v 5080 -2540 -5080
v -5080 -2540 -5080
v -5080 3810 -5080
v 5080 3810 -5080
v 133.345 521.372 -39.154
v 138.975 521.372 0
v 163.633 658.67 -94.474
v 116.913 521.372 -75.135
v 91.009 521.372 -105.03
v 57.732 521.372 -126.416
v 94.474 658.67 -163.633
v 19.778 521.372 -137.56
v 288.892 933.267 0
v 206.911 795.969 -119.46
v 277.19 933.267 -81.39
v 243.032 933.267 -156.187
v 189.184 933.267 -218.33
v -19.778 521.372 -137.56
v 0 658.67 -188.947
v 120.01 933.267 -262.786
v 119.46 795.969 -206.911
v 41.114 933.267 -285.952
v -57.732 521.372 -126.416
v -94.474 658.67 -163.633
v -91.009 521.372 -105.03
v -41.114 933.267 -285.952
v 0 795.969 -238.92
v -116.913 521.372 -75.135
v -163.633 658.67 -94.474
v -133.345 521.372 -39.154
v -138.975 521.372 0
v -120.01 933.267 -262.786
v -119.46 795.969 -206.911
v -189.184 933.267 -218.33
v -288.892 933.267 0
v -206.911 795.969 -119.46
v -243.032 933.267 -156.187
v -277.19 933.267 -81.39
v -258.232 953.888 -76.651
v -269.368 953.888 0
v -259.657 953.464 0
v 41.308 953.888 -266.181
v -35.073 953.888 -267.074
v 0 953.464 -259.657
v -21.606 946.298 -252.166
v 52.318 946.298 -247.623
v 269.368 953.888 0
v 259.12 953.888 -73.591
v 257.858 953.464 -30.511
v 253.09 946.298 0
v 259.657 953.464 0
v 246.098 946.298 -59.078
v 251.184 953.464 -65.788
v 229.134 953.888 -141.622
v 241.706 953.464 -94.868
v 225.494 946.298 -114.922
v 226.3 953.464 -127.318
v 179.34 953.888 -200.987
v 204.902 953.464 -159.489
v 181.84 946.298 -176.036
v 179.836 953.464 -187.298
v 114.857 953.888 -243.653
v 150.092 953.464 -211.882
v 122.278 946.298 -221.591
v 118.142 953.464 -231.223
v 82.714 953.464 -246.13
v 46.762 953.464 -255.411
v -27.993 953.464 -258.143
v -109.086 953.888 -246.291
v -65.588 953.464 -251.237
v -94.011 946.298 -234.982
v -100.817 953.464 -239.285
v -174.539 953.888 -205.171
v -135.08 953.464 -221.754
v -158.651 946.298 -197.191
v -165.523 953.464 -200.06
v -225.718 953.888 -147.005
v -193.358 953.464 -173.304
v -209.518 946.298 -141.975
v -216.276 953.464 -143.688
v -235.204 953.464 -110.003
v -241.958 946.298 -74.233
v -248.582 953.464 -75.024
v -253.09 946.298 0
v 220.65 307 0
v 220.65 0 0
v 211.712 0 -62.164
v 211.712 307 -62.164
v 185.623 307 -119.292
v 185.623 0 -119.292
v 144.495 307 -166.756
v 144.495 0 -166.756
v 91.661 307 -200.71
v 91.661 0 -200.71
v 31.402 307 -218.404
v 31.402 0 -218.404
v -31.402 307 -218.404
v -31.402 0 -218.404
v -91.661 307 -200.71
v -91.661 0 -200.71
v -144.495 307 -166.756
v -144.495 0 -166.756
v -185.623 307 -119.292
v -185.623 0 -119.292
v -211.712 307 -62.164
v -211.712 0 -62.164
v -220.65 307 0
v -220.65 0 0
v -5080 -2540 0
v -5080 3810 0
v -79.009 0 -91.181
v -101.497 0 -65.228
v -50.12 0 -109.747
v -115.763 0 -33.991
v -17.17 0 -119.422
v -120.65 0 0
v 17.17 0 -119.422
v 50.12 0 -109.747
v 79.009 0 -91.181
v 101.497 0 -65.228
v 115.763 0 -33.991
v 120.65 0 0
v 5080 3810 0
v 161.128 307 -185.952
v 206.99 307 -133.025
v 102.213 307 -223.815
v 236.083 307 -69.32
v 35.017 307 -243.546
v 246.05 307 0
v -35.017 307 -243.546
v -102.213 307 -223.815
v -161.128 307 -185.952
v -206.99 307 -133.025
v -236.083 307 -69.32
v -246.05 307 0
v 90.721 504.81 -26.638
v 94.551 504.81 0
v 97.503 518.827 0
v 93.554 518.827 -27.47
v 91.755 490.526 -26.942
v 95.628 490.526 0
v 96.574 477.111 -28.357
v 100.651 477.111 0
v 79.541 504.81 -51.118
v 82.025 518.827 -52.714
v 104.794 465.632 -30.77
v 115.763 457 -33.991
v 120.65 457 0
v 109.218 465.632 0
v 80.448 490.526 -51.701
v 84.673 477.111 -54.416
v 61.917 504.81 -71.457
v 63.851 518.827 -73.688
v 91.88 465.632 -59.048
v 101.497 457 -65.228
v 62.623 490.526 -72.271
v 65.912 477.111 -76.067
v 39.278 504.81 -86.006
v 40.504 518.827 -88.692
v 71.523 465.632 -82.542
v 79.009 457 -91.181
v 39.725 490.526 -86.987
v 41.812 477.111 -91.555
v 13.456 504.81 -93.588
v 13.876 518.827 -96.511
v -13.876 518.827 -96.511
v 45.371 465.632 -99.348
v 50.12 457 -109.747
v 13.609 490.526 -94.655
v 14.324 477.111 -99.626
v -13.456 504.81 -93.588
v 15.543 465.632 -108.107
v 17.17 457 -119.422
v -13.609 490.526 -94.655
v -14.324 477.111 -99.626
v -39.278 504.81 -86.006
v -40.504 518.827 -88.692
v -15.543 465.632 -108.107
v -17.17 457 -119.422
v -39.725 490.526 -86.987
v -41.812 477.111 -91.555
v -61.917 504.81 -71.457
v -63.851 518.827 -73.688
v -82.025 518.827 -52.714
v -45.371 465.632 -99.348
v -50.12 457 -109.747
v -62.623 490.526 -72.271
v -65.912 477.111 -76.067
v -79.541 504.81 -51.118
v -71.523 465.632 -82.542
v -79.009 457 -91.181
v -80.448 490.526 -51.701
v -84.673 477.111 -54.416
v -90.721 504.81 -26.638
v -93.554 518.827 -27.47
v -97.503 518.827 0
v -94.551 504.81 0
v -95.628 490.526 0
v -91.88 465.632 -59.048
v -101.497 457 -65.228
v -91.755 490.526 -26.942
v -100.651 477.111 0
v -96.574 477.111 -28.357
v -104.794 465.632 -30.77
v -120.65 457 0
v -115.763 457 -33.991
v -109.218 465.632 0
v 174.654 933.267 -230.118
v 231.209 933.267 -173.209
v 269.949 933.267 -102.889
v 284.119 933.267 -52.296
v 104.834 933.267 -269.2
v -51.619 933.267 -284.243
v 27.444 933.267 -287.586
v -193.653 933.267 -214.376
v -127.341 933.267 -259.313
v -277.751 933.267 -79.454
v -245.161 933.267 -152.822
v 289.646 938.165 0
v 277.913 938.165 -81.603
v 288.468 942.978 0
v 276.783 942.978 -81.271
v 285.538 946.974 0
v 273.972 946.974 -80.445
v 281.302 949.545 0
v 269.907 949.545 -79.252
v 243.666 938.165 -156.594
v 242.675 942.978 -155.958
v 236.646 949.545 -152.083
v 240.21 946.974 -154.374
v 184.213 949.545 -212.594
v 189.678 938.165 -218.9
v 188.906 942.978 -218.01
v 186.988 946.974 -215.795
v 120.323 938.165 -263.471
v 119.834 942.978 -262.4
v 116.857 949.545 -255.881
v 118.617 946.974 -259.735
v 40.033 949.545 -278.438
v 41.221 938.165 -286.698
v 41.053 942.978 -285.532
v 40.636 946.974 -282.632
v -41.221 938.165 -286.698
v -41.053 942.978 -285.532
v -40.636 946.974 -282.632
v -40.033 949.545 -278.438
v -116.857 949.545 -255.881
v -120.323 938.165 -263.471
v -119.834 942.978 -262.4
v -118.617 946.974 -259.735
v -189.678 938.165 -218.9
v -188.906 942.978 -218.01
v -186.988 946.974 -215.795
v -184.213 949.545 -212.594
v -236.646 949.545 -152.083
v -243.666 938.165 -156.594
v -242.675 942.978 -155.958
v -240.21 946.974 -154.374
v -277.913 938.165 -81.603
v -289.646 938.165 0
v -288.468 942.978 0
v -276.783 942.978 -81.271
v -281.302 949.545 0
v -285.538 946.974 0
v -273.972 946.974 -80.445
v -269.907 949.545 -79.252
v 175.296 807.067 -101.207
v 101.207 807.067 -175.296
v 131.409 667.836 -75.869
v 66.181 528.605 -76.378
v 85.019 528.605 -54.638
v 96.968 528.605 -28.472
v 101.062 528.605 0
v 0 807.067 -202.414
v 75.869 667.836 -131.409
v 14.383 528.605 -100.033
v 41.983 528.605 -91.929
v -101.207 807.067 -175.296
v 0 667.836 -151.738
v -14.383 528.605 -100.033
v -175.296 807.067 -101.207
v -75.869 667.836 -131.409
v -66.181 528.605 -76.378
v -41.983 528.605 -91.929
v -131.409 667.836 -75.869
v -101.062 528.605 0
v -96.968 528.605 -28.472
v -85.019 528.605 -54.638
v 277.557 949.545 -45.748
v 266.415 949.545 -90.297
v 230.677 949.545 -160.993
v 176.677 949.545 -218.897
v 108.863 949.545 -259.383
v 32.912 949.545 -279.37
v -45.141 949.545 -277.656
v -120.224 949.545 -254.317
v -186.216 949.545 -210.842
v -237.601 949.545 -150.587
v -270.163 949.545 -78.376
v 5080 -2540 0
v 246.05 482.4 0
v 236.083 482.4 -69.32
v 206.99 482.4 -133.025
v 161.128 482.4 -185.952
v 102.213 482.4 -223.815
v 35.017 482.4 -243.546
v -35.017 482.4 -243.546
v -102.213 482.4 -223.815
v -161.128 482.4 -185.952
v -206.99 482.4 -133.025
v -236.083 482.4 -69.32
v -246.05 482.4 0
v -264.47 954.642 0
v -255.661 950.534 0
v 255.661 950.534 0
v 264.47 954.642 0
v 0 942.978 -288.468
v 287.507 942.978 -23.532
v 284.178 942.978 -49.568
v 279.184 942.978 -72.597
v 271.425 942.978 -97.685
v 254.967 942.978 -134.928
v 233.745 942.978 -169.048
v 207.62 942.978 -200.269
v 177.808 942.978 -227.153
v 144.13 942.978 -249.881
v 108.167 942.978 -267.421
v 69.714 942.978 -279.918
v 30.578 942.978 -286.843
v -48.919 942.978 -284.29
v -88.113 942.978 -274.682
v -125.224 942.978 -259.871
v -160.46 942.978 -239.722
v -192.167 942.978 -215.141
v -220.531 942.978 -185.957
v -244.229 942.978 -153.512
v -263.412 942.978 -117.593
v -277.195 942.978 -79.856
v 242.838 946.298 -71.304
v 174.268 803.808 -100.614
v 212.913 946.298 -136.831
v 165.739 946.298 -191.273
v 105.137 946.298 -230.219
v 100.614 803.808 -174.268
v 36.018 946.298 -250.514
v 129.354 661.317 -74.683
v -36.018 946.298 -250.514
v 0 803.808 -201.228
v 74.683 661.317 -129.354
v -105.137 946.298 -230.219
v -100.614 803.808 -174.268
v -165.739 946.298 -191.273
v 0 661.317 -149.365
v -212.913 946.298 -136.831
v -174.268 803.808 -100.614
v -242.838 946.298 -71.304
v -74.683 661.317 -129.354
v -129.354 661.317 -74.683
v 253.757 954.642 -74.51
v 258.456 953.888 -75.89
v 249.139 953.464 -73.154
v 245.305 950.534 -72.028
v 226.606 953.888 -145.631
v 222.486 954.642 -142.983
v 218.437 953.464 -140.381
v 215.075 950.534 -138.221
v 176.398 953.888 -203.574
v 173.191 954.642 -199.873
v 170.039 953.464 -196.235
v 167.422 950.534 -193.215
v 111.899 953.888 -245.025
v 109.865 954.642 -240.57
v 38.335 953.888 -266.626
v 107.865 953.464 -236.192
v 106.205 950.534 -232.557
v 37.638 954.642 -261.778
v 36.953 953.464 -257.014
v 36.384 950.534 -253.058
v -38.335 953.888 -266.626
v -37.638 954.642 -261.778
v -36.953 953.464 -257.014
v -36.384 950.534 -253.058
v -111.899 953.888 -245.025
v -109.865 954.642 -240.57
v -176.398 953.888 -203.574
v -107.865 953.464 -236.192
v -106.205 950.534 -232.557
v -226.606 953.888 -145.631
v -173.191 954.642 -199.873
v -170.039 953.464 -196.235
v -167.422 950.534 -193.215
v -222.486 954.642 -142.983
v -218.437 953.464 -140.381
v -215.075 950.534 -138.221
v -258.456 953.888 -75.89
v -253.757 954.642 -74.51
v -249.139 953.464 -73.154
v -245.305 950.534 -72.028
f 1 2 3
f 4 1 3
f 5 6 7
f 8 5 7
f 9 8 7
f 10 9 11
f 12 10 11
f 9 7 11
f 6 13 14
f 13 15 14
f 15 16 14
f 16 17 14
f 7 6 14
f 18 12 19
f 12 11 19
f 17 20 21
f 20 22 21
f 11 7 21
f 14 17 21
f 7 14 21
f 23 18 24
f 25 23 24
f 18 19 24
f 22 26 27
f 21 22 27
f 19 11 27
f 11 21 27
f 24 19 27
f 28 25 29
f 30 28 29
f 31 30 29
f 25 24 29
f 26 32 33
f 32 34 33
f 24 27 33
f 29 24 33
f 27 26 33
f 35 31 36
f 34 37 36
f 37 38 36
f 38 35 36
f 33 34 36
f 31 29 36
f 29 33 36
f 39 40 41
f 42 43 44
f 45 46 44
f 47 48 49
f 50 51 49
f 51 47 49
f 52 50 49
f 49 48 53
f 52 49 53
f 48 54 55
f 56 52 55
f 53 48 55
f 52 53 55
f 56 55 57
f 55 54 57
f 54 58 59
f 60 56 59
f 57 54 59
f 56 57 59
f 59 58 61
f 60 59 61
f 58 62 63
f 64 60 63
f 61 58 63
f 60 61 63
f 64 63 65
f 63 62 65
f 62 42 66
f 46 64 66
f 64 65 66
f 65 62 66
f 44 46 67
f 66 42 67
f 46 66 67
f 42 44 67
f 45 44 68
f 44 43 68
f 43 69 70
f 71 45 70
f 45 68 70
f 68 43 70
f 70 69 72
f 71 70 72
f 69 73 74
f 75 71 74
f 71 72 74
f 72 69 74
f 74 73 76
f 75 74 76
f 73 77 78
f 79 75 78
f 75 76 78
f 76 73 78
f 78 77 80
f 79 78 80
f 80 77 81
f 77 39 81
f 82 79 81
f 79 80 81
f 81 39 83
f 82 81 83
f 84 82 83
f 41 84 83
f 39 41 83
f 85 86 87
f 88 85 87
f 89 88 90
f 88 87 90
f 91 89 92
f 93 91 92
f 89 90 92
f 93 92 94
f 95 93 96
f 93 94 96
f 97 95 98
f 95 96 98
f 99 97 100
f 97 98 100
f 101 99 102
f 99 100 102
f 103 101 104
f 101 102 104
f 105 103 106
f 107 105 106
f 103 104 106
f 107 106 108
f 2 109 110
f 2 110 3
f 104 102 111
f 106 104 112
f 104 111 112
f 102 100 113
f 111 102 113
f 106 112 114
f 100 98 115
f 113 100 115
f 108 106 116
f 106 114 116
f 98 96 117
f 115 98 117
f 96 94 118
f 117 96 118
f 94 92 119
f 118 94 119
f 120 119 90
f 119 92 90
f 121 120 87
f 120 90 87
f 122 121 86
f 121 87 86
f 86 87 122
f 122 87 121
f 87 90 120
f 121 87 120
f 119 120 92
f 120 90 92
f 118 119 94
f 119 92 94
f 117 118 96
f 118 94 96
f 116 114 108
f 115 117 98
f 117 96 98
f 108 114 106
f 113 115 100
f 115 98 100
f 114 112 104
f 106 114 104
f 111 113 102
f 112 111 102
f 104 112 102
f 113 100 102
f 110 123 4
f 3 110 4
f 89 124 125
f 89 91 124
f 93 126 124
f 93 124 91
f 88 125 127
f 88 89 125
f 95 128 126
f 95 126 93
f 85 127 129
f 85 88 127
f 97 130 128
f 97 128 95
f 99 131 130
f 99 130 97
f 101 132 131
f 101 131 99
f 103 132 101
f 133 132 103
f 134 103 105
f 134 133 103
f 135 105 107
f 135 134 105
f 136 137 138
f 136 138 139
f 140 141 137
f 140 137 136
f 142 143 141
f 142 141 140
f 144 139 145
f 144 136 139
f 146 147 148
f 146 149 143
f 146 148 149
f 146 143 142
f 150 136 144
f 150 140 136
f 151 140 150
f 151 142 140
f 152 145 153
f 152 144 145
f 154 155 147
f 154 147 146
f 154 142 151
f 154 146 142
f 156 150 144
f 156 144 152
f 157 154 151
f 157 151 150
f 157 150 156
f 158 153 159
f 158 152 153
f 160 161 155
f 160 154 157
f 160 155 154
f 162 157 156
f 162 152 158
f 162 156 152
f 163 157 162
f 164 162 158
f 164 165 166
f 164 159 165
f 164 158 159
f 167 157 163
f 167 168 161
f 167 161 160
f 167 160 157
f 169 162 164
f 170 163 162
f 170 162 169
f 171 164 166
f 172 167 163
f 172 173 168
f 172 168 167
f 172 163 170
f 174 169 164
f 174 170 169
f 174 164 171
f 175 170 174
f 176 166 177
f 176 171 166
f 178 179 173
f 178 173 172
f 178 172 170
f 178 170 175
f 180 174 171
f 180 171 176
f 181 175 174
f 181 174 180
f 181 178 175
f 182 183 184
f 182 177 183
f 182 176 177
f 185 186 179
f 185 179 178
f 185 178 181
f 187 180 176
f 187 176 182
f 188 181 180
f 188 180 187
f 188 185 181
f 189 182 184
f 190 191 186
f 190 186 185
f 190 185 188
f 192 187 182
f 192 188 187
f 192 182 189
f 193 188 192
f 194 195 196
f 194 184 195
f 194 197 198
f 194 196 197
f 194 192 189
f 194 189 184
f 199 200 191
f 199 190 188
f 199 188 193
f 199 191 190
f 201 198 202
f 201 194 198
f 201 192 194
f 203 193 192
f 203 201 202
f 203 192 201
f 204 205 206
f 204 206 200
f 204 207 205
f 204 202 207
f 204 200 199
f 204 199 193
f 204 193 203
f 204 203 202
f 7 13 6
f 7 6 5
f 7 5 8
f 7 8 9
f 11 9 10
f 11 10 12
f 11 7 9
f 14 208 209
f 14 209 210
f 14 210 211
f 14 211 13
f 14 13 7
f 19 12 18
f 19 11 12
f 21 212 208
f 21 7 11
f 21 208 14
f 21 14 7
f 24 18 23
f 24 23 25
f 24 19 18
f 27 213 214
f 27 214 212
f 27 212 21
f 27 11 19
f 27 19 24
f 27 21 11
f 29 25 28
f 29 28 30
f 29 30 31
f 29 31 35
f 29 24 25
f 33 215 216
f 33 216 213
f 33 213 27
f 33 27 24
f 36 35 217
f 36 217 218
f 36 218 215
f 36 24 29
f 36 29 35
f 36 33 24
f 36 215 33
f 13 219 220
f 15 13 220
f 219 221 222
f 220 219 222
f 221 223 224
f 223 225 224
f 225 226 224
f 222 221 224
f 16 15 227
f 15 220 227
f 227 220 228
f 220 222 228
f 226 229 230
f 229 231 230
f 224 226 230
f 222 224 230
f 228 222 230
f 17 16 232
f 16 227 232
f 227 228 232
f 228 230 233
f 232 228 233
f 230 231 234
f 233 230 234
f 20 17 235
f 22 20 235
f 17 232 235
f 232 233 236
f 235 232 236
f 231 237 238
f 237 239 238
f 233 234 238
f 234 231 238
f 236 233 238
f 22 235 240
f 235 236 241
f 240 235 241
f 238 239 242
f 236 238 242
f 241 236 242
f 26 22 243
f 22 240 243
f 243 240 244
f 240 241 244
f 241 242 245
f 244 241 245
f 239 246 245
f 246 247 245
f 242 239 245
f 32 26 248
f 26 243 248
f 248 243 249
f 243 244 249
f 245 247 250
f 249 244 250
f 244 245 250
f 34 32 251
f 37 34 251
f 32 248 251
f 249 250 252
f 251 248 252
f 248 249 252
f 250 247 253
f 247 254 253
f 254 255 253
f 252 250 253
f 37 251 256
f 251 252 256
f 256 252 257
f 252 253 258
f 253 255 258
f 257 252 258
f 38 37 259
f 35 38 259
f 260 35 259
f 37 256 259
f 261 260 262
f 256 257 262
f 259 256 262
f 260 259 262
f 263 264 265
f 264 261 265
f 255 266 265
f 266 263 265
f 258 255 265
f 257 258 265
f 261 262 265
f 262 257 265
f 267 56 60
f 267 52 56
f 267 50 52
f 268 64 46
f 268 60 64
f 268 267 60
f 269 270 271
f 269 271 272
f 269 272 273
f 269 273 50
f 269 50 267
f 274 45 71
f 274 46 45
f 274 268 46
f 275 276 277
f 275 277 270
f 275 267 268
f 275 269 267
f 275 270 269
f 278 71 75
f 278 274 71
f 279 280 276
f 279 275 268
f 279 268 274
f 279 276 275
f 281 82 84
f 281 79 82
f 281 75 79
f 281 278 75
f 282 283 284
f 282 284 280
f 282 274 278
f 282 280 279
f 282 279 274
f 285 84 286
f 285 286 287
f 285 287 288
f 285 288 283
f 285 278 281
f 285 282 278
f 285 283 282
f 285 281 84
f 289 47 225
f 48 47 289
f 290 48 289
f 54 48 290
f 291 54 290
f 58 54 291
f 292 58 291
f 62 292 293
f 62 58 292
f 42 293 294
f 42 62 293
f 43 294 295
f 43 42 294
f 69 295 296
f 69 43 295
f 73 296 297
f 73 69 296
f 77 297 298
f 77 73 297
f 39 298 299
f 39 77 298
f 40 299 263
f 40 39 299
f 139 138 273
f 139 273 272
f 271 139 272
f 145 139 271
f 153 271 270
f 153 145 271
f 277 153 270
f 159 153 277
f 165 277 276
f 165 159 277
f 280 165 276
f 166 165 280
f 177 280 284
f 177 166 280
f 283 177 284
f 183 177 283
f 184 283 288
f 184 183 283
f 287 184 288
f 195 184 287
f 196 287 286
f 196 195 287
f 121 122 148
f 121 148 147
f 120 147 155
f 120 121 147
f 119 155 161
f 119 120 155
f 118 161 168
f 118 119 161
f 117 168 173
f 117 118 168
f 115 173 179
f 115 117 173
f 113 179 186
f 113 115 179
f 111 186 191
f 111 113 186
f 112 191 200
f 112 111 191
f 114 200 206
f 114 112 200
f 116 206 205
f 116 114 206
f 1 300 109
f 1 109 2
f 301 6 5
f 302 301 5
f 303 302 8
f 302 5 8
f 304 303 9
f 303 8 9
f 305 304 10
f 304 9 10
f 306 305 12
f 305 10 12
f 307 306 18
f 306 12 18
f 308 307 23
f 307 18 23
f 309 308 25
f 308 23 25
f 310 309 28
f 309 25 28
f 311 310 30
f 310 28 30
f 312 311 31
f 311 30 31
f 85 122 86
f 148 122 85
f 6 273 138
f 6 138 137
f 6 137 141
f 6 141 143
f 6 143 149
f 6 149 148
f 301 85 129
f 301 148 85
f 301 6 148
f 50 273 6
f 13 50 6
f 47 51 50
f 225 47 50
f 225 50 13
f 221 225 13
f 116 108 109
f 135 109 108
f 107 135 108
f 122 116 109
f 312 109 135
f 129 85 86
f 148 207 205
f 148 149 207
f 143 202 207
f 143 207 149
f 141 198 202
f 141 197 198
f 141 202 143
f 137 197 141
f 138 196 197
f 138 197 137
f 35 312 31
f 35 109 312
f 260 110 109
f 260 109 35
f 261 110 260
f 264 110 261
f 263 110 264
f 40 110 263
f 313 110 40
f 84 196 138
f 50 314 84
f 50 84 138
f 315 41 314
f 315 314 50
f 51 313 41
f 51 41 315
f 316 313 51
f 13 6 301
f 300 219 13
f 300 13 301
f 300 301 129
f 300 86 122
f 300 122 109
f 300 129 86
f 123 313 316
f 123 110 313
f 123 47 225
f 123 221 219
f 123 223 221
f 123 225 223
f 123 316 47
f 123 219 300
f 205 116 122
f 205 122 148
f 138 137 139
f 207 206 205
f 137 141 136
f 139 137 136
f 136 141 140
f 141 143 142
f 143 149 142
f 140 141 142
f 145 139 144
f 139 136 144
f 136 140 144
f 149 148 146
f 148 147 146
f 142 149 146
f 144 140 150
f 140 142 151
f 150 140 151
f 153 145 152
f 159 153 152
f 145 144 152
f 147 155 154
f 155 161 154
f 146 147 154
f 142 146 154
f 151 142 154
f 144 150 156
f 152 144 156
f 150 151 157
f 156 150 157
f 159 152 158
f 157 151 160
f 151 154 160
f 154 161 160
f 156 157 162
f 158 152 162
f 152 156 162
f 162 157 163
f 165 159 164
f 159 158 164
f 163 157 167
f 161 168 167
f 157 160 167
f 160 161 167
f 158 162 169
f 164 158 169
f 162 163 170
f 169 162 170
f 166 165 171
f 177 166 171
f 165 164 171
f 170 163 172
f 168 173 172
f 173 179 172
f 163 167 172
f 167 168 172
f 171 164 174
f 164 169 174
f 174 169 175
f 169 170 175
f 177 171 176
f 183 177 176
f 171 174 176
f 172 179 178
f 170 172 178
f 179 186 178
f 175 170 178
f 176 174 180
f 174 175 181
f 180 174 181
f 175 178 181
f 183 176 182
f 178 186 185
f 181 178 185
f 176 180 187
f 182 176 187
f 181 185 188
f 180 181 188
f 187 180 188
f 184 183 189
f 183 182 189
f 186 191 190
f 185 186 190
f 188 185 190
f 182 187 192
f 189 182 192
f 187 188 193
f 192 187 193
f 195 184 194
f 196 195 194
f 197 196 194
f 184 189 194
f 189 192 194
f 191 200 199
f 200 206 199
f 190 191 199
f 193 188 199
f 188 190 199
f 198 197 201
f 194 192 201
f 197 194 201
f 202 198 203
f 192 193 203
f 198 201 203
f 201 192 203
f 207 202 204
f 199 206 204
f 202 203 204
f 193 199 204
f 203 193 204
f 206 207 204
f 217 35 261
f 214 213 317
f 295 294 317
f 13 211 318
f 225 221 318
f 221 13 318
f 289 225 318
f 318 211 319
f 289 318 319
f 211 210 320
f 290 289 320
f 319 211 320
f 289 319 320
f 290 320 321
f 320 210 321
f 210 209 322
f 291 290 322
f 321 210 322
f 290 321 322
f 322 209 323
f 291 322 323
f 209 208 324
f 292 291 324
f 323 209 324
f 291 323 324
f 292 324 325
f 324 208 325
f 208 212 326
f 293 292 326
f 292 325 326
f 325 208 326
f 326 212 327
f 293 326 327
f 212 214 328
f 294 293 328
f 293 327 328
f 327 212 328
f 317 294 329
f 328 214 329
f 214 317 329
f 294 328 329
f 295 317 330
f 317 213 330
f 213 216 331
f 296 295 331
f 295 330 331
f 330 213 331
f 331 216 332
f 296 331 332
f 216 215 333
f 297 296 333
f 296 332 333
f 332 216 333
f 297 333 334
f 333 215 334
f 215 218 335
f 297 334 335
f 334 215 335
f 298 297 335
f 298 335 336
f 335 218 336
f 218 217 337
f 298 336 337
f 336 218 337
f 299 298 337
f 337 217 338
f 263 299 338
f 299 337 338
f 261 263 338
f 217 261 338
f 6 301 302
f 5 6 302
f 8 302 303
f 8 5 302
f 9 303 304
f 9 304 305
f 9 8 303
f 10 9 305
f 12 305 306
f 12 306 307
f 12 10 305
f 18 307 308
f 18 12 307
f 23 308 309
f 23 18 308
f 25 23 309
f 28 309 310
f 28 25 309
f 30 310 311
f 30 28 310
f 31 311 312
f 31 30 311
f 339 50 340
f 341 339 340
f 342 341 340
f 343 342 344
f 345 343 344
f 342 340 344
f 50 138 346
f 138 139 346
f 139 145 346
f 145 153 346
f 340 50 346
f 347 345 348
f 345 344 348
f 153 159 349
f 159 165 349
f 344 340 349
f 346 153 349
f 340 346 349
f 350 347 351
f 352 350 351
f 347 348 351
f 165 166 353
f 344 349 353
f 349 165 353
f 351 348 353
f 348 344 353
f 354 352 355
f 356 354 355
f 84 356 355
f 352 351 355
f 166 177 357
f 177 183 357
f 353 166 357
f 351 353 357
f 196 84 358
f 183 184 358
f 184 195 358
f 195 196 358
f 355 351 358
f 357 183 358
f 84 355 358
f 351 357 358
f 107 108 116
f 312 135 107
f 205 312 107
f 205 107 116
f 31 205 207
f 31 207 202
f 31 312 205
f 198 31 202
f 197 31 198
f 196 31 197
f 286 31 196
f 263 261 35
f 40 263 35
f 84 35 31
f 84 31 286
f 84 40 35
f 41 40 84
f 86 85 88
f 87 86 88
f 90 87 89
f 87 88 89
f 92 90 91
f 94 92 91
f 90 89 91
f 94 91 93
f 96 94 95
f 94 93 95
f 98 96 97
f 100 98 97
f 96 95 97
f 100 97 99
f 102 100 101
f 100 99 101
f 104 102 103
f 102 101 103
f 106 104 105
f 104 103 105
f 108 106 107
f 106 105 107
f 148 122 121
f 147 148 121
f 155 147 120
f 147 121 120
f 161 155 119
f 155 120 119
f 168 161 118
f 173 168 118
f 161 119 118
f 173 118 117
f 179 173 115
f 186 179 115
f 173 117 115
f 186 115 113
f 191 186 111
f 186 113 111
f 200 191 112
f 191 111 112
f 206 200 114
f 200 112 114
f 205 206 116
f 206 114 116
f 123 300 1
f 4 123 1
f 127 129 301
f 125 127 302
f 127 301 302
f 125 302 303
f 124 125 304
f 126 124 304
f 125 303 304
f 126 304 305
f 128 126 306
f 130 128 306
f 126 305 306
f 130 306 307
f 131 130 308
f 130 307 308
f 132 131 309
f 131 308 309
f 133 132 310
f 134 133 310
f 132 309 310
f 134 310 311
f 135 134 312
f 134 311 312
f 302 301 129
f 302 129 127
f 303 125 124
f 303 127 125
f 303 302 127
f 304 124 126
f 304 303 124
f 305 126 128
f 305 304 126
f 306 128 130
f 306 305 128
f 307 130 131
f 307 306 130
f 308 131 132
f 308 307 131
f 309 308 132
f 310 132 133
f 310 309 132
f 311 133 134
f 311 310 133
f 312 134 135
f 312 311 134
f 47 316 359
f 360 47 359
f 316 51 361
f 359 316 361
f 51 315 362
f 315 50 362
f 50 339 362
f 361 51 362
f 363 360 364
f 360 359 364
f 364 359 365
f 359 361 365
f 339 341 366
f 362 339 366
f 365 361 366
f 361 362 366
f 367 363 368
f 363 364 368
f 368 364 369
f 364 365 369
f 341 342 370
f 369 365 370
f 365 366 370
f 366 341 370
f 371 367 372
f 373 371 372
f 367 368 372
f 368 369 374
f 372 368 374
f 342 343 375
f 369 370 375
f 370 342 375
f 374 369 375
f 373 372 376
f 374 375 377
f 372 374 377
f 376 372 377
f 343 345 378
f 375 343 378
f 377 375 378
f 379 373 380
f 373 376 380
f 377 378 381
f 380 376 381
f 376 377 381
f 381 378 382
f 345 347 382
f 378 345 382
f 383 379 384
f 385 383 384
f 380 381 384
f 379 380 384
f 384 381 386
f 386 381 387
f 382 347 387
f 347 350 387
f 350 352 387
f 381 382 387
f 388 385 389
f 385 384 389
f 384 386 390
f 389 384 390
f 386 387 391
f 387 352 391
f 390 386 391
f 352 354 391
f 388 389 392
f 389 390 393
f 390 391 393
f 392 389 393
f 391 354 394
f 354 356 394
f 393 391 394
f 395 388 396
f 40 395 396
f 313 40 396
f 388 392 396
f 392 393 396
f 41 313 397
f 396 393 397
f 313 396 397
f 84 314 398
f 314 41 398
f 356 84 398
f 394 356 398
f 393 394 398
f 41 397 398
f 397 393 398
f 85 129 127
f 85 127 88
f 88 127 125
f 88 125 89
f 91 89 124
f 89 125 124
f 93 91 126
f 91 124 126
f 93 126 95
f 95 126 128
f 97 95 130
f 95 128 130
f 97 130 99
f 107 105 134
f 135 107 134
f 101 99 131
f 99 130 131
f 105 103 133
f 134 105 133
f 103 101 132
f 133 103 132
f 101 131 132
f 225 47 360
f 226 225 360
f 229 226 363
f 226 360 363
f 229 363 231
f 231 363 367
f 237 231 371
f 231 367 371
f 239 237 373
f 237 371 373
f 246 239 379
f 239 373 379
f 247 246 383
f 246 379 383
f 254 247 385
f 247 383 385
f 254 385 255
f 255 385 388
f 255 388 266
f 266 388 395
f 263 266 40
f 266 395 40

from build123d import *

# Parameters (mm, degrees)
SKETCH1_R           = 220.65
SKETCH1_R_2         = 120.65
BOSS_EXTRUDE1_DEPTH = 457
FILLET1_R           = 50.8
FILLET2_R           = 12.7
SKETCH3_W           = 10160
SKETCH3_H           = 6350
BOSS_EXTRUDE2_DEPTH = 5080
SKETCH4_W           = 13475.768327993
SKETCH4_H           = 8367.586519284
CUT_EXTRUDE1_DEPTH  = 8132.96778154


# Read off the part's stored shape, not the designer's step: Intersect1
with BuildPart() as part:
    # Sketch1 → Boss-Extrude1 (new body)
    with BuildSketch(Plane(origin=(0, 0, 0), x_dir=(1, 0, 0), z_dir=(0, 1, 0))):
        with Locations(Location((0, 0, 0), (0, 0, 270))):
            Circle(SKETCH1_R)
        with Locations(Location((0, 0, 0), (0, 0, 270))):
            Circle(SKETCH1_R_2, mode=Mode.SUBTRACT)
    extrude(amount=BOSS_EXTRUDE1_DEPTH)

    # Sketch2 → Revolve1 (revolve)
    with BuildSketch(Plane.XY, mode=Mode.PRIVATE) as revolve1_sk:
        Polygon((-220.65, 307), (-246.05, 307), (-246.05, 482.4), (-138.974740497, 521.372207285), (-293.235833302, 945.201076466), (-257.43354445, 958.232043927), (-101.061934921, 528.604577704), (-75, 457), (-220.65, 457), align=None)
    revolve(revolve1_sk.sketch.rotate(Axis((0, 0, 0), (0, 1, 0)), 270), axis=Axis((0, 0, 0), (0, 1, 0)))

    # Fillet1
    # the kernel refuses this fillet: 50.8 mm, written as the material it takes off along each edge
    with BuildSketch(Plane(origin=(0, 457, 0), x_dir=(0, 0, -1), z_dir=(1, 0, 0))) as fillet1_piece_1:
        with BuildLine():
            CenterArc((145.239501631, 44.452181156), FILLET1_R, 160, 81.050057514)
            Line((120.65, 0), (120.158209967, -0.889043623))
            ThreePointArc((120.158209967, -0.889043623), (97.825, -1.016), (75, -1.016))
            Line((75, -1.016), (74.045272297, 0.347492466))
            Line((74.045272297, 0.347492466), (96.548388792, 62.174296903))
            Line((96.548388792, 62.174296903), (97.503116495, 61.826804437))
        make_face()
    revolve(axis=Axis((0, 457, 0), (0, 1, 0)), mode=Mode.SUBTRACT)

    # Fillet2
    fillet2_edges = [part.edges().sort_by_distance(p)[0] for p in [
        (0, 945.201076466, 293.235833302),
        (0, 958.232043927, 257.43354445),
    ]]
    fillet(fillet2_edges, radius=FILLET2_R)


with BuildPart() as body_2:
    # Sketch3 → Boss-Extrude2 (new, symmetric)
    with BuildSketch(Plane(origin=(0, 0, 0), x_dir=(0, 0, -1), z_dir=(1, 0, 0))):
        with Locations((0, 635)):
            Rectangle(SKETCH3_W, SKETCH3_H)
    extrude(amount=BOSS_EXTRUDE2_DEPTH, both=True)

    # Intersect1 outline → Intersect1 (revolve, cut)
    with BuildSketch(Plane.XY):
        with BuildLine():
            Line((281.301737018, 949.544732287), (269.367640734, 953.888388107))
            ThreePointArc((269.367640734, 953.888388107), (259.65673299, 953.464400718), (253.08988863, 946.297947643))
            Line((253.08988863, 946.297947643), (97.503116495, 518.826804437))
            ThreePointArc((97.503116495, 518.826804437), (97.664330471, 483.640862027), (120.65, 457))
            Line((120.65, 457), (120.65, 0))
            Line((120.65, 0), (220.65, 0))
            Line((220.65, 0), (220.65, 307))
            Line((220.65, 307), (246.05, 307))
            Line((246.05, 307), (246.05, 482.4))
            Line((246.05, 482.4), (138.974740497, 521.372207285))
            Line((138.974740497, 521.372207285), (288.892177482, 933.266980183))
            ThreePointArc((288.892177482, 933.266980183), (288.468190093, 942.977887927), (281.301737018, 949.544732287))
        make_face()
    revolve(axis=Axis((0, 0, 0), (0, 1, 0)), mode=Mode.SUBTRACT)


with BuildPart() as cut_extrude1_tool:
    # Sketch4 → Cut-Extrude1 (new, through all)
    with BuildSketch(Plane.XY):
        with Locations((454.179344916, 464.014834855)):
            Rectangle(SKETCH4_W, SKETCH4_H)
    extrude(amount=CUT_EXTRUDE1_DEPTH)


with BuildPart() as part_1:
    add(part.part)

    # Cut-Extrude1: cut by cut_extrude1_tool
    add(cut_extrude1_tool.part, mode=Mode.SUBTRACT)


with BuildPart() as body_2_1:
    add(body_2.part)

    # Cut-Extrude1: cut by cut_extrude1_tool
    add(cut_extrude1_tool.part, mode=Mode.SUBTRACT)


solid = Compound([part_1.part, body_2_1.part])
